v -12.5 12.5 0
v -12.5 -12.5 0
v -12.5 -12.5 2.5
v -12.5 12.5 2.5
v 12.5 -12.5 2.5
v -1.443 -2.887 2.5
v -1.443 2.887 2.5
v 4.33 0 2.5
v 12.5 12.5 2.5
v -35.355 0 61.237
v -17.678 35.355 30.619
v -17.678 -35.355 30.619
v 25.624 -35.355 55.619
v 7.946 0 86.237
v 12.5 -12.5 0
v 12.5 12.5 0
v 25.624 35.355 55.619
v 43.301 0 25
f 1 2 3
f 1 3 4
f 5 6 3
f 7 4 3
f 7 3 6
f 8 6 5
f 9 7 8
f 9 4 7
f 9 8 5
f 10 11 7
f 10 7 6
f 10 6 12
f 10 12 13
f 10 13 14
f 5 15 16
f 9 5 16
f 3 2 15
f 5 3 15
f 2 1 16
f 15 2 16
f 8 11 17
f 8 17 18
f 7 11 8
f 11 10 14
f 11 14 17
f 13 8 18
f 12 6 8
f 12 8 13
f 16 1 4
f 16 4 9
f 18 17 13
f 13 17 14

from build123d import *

# Parameters (mm, degrees)
F0_W     = 25
F0_H     = 25
F1_DEPTH = 2.5
F5_DEPTH = 50


# Not quite as in the source:
# - a feature of the source that left no trace in its solid (it failed there, or was rolled back) is left out


with BuildPart() as f1:
    # F0 (on Top) → F1 (new body)
    with BuildSketch(Plane.XY):
        Rectangle(F0_W, F0_H)
    extrude(amount=F1_DEPTH)

    # F4 (on line) → F5 (join)
    with BuildSketch(Plane(origin=(0, 0, 0), x_dir=(0, -1, 0), z_dir=(-0.8660254038, 0, -0.5))):
        Polygon((-35.3553390593, 35.3553390593), (0, 0), (35.3553390593, 35.3553390593), (0, 70.7106781187), align=None)
    extrude(amount=-F5_DEPTH)


solid = f1.part
